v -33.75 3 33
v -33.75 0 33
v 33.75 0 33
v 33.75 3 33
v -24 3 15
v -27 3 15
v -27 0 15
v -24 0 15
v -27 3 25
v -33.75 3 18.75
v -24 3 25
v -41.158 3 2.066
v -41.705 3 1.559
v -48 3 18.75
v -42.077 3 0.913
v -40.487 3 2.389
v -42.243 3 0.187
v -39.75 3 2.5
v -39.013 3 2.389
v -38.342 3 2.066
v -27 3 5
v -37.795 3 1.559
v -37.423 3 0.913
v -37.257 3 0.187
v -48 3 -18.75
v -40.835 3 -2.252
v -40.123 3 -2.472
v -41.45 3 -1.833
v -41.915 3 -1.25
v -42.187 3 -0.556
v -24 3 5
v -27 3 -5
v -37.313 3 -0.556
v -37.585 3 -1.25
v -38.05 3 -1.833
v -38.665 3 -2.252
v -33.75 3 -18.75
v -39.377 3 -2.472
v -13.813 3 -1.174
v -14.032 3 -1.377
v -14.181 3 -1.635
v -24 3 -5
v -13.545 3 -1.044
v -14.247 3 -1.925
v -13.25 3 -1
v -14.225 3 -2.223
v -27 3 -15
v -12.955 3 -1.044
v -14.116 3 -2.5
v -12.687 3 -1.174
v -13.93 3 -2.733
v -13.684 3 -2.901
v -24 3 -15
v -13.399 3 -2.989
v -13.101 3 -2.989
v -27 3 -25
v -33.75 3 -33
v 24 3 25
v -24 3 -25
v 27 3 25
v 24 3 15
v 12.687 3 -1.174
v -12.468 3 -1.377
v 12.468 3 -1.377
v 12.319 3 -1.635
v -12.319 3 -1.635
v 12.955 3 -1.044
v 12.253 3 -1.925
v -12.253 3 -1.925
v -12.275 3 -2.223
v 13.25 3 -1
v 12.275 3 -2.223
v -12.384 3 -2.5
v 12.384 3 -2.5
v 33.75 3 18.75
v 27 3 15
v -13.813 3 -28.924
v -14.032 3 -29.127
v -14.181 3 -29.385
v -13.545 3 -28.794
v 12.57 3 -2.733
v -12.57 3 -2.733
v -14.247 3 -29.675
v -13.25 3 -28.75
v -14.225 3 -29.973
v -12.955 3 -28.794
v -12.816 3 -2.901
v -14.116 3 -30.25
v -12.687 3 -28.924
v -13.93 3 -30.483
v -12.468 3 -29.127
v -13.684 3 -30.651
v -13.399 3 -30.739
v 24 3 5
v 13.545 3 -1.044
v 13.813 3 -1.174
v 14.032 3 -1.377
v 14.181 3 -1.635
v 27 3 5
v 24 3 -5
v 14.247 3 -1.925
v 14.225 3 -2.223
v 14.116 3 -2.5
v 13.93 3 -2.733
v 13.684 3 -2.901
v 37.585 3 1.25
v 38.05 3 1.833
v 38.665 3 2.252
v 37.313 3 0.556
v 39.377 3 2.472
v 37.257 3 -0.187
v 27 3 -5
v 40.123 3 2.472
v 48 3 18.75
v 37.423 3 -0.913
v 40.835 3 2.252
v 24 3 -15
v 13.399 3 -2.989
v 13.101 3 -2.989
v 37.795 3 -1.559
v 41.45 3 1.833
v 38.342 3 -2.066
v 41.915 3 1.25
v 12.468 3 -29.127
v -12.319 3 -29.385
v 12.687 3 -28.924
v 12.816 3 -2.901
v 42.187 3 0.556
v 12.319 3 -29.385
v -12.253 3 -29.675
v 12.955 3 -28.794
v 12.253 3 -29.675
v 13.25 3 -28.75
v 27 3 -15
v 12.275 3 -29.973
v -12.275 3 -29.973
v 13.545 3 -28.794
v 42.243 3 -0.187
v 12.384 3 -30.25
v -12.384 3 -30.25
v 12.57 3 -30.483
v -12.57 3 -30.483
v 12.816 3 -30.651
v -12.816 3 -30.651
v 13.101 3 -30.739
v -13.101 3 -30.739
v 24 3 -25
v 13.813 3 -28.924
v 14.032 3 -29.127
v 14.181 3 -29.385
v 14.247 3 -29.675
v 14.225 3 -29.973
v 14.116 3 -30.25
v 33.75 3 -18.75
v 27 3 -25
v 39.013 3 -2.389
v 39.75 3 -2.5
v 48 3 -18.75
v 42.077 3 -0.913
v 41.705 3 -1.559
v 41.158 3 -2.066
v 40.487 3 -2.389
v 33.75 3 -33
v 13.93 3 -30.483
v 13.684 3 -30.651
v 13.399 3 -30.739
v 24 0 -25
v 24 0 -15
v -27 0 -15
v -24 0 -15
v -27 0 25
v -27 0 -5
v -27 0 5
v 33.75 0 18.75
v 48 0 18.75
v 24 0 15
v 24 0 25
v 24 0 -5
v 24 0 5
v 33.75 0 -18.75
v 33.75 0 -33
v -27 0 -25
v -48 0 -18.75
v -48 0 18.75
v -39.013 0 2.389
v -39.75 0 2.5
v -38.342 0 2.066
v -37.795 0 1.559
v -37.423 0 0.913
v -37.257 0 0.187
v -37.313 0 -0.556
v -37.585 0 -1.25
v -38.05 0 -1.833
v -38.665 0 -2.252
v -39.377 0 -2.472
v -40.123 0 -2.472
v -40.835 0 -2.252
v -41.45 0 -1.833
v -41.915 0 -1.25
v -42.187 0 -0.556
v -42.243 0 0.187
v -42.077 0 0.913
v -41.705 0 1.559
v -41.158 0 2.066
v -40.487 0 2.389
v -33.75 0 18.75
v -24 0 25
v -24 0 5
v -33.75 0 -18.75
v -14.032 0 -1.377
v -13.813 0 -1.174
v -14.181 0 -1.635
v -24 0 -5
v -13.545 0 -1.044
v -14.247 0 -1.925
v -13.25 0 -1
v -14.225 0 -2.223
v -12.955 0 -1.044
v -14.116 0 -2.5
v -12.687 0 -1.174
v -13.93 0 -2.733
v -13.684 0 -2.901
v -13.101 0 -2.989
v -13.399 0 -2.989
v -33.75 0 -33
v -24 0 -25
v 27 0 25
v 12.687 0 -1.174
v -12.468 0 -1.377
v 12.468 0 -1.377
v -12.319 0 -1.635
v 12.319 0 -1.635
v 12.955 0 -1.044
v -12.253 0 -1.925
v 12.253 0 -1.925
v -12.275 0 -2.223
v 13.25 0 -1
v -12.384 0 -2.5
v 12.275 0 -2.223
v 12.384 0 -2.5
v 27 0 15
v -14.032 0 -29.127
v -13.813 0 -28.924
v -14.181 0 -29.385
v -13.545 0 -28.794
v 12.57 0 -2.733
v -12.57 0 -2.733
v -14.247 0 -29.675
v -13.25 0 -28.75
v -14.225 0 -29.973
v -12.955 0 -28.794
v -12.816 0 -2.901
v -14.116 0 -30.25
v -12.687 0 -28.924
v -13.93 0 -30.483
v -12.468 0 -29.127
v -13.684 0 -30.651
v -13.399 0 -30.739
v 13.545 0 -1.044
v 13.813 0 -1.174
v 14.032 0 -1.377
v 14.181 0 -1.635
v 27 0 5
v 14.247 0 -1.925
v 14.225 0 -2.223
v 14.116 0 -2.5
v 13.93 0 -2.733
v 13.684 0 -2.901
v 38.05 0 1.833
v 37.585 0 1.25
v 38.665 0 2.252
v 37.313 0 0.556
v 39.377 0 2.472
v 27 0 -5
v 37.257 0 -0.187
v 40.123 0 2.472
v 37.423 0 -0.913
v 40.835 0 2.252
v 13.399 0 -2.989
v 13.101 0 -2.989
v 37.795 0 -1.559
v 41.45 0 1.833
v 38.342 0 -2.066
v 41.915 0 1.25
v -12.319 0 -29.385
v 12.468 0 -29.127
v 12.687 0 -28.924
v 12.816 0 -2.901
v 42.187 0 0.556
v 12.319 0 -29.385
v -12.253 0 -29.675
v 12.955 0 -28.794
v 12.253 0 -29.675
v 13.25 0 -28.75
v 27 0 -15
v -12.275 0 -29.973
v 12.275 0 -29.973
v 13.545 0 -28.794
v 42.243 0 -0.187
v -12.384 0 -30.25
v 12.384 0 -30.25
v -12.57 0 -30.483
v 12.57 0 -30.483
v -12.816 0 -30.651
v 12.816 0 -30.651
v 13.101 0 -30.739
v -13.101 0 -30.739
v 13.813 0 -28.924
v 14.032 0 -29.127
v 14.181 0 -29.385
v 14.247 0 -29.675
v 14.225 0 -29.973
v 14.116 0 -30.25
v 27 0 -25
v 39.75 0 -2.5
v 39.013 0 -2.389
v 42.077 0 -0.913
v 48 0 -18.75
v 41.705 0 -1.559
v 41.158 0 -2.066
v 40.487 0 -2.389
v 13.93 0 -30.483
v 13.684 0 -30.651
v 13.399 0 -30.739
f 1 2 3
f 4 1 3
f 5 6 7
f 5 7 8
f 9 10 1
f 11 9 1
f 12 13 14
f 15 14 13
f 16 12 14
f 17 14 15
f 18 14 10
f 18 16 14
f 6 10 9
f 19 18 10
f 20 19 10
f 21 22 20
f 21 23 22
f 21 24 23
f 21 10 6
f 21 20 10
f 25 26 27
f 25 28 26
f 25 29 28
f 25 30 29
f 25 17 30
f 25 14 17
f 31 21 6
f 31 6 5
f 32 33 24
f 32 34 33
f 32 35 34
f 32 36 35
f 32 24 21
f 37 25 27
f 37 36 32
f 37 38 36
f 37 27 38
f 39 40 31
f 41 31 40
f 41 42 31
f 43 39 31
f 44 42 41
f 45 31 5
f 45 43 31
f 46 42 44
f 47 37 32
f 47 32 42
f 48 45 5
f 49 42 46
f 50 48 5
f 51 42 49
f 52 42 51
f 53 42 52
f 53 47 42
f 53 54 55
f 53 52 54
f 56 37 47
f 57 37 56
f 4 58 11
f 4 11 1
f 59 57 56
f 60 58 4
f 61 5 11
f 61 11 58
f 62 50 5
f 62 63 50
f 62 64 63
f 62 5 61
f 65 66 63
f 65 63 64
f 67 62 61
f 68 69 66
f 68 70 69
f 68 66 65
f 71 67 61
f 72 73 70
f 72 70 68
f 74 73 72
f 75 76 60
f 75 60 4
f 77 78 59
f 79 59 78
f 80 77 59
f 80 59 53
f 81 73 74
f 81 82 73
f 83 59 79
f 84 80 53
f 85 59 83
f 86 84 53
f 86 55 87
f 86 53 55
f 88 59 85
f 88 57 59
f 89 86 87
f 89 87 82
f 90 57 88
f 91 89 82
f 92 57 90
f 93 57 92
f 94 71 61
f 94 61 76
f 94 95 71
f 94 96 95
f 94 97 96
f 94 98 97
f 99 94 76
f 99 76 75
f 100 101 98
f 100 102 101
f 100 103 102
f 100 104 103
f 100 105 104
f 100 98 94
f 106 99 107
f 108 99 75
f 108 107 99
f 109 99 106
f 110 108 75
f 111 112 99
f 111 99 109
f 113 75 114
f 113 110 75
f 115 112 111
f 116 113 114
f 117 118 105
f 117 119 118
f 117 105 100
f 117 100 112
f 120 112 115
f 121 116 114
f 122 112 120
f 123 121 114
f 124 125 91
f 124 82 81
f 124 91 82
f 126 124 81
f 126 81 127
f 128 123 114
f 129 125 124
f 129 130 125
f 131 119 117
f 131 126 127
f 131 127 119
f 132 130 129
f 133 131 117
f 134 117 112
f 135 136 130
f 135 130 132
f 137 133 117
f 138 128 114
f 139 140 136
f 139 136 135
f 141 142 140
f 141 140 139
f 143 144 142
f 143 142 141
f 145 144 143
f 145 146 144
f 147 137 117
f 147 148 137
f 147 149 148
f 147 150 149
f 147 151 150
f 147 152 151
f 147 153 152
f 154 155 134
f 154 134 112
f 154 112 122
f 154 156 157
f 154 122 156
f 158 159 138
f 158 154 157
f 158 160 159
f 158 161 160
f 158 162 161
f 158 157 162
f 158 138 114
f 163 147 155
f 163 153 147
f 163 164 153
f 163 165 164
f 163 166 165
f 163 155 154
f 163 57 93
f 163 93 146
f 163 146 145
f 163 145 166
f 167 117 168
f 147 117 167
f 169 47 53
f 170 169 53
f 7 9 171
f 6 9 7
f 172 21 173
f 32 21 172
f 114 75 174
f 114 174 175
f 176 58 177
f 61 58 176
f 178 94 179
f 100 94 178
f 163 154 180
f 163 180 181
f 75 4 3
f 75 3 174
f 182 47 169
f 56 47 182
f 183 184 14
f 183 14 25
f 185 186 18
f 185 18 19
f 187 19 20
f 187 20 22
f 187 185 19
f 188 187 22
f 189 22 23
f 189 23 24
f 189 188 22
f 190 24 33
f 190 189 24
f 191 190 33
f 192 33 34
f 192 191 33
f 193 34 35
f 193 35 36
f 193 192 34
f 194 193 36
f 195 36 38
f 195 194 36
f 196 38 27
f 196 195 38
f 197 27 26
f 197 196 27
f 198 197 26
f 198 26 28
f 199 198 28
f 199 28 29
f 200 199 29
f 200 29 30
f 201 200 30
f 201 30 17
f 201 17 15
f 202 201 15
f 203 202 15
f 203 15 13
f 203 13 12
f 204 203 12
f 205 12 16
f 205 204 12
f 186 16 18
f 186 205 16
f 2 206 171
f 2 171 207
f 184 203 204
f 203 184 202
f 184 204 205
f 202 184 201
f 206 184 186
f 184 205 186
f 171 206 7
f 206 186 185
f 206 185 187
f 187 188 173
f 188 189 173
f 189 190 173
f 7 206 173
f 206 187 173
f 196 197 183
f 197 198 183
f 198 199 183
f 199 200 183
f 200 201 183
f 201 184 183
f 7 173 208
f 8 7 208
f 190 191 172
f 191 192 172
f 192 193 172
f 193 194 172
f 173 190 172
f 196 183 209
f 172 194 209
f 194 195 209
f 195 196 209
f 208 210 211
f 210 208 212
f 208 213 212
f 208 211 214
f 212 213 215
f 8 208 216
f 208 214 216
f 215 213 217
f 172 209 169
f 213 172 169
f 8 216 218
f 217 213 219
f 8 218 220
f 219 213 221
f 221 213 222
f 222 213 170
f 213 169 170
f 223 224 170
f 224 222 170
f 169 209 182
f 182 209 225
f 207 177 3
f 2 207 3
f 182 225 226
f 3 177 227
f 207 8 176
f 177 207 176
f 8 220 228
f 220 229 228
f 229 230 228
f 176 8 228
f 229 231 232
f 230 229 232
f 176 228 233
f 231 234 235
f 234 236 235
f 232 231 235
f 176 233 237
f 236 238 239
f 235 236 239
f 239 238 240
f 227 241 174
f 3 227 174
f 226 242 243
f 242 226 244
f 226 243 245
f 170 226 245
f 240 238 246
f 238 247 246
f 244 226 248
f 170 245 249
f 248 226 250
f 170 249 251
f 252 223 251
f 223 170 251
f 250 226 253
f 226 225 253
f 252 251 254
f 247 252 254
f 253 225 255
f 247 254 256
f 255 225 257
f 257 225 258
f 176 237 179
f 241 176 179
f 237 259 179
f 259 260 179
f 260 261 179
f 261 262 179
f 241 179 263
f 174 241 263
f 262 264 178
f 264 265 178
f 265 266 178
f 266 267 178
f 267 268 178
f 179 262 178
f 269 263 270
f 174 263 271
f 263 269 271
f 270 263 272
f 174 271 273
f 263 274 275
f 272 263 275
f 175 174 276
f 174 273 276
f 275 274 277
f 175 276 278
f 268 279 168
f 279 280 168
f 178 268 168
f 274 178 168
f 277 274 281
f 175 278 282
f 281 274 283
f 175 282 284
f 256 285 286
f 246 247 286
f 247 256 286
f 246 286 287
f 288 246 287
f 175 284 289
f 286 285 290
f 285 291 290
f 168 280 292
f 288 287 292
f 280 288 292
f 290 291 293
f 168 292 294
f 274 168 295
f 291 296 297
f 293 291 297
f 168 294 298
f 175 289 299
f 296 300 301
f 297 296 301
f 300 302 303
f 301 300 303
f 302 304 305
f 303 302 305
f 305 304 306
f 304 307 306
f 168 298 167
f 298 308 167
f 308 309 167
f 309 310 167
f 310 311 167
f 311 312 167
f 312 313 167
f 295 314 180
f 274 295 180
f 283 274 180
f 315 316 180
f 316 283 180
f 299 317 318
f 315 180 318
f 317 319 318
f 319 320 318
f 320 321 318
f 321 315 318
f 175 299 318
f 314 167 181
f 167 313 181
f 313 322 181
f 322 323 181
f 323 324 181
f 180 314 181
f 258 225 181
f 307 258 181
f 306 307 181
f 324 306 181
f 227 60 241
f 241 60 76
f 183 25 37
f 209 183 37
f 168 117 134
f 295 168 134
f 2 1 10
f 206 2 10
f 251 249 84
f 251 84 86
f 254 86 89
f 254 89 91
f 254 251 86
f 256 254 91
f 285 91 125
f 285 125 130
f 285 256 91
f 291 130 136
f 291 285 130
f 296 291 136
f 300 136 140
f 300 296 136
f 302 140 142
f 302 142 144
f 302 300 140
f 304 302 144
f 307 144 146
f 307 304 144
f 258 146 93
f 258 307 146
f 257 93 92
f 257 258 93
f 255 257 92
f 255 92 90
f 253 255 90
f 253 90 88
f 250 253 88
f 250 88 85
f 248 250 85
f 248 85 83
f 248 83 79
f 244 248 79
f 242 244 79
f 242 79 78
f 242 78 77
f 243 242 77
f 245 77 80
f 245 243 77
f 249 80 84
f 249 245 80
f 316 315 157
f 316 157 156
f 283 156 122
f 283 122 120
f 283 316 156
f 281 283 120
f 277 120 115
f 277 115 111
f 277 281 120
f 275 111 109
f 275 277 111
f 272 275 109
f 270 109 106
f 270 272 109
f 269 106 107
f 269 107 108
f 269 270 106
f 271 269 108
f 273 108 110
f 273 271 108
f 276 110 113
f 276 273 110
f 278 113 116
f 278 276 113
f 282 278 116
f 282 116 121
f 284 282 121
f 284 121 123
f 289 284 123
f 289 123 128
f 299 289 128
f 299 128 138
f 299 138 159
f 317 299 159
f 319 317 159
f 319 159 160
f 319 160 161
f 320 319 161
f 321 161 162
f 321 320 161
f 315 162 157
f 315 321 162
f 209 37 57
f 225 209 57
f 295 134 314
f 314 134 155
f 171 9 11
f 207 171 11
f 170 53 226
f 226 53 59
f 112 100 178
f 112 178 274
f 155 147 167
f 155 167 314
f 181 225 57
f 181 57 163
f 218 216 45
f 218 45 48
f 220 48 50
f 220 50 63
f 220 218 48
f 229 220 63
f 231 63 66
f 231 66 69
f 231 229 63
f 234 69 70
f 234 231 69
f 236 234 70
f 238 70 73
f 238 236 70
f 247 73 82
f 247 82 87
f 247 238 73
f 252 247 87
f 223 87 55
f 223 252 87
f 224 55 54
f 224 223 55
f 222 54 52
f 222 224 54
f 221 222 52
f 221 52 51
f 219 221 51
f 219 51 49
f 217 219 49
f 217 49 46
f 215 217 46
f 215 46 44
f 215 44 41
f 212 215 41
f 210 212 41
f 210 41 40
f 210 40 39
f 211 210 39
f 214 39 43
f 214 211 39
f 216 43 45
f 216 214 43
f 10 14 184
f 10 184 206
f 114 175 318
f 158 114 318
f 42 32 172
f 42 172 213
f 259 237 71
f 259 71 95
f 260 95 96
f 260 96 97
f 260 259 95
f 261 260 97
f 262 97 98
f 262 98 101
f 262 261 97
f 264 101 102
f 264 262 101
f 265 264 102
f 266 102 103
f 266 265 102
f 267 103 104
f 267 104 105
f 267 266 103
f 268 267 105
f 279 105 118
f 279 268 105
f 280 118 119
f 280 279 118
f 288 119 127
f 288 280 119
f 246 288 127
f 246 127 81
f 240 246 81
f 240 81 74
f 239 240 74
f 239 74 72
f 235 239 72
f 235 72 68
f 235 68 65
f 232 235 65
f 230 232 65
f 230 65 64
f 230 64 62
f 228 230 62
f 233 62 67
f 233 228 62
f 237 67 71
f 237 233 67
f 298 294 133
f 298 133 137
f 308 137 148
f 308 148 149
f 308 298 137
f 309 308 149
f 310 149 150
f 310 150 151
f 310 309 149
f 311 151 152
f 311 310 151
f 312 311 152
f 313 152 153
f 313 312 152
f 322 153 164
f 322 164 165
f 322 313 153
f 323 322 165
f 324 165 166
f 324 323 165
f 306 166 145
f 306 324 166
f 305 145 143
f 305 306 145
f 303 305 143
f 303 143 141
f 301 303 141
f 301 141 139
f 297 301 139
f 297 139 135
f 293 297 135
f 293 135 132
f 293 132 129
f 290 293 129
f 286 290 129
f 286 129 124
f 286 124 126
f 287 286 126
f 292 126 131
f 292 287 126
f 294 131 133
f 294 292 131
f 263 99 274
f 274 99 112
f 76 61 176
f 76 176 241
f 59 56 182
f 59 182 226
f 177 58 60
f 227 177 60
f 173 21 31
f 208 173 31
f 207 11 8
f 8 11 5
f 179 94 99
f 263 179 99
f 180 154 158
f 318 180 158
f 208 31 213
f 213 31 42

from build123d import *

# Parameters (mm, degrees)
SKETCH1_W           = 96
SKETCH1_H           = 66
SKETCH1_R           = 2.5
SKETCH1_R_2         = 1
BOSS_EXTRUDE1_DEPTH = 3
SKETCH2_W           = 14.25
SKETCH2_H           = 14.25
SKETCH2_W_2         = 3
SKETCH2_H_2         = 10
CUT_EXTRUDE1_DEPTH  = 3


with BuildPart() as part:
    # Sketch1 → Boss-Extrude1 (new body)
    with BuildSketch(Plane(origin=(0, 0, 0), x_dir=(1, 0, 0), z_dir=(0, 1, 0))):
        Rectangle(SKETCH1_W, SKETCH1_H)
        with Locations(Location((-39.75, 0, 0), (0, 0, 270))):
            Circle(SKETCH1_R, mode=Mode.SUBTRACT)
        with Locations(Location((39.75, 0, 0), (0, 0, 90))):
            Circle(SKETCH1_R, mode=Mode.SUBTRACT)
        with Locations(Location((-13.25, 29.75, 0), (0, 0, 270))):
            Circle(SKETCH1_R_2, mode=Mode.SUBTRACT)
        with Locations(Location((-13.25, 2, 0), (0, 0, 270))):
            Circle(SKETCH1_R_2, mode=Mode.SUBTRACT)
        with Locations(Location((13.25, 2, 0), (0, 0, 270))):
            Circle(SKETCH1_R_2, mode=Mode.SUBTRACT)
        with Locations(Location((13.25, 29.75, 0), (0, 0, 270))):
            Circle(SKETCH1_R_2, mode=Mode.SUBTRACT)
    extrude(amount=BOSS_EXTRUDE1_DEPTH)

    # Sketch2 → Cut-Extrude1 (cut)
    with BuildSketch(Plane(origin=(0, 3, 0), x_dir=(1, 0, 0), z_dir=(0, 1, 0))):
        with Locations((40.875, 25.875)):
            Rectangle(SKETCH2_W, SKETCH2_H)
        with Locations((-40.875, 25.875)):
            Rectangle(SKETCH2_W, SKETCH2_H)
        with Locations((40.875, -25.875)):
            Rectangle(SKETCH2_W, SKETCH2_H)
        with Locations((-40.875, -25.875)):
            Rectangle(SKETCH2_W, SKETCH2_H)
        with Locations((-25.5, -20)):
            Rectangle(SKETCH2_W_2, SKETCH2_H_2)
        with Locations((-25.5, 0)):
            Rectangle(SKETCH2_W_2, SKETCH2_H_2)
        with Locations((-25.5, 20)):
            Rectangle(SKETCH2_W_2, SKETCH2_H_2)
        with Locations((25.5, 20)):
            Rectangle(SKETCH2_W_2, SKETCH2_H_2)
        with Locations((25.5, -20)):
            Rectangle(SKETCH2_W_2, SKETCH2_H_2)
        with Locations((25.5, 0)):
            Rectangle(SKETCH2_W_2, SKETCH2_H_2)
    extrude(amount=-CUT_EXTRUDE1_DEPTH, mode=Mode.SUBTRACT)


solid = part.part
